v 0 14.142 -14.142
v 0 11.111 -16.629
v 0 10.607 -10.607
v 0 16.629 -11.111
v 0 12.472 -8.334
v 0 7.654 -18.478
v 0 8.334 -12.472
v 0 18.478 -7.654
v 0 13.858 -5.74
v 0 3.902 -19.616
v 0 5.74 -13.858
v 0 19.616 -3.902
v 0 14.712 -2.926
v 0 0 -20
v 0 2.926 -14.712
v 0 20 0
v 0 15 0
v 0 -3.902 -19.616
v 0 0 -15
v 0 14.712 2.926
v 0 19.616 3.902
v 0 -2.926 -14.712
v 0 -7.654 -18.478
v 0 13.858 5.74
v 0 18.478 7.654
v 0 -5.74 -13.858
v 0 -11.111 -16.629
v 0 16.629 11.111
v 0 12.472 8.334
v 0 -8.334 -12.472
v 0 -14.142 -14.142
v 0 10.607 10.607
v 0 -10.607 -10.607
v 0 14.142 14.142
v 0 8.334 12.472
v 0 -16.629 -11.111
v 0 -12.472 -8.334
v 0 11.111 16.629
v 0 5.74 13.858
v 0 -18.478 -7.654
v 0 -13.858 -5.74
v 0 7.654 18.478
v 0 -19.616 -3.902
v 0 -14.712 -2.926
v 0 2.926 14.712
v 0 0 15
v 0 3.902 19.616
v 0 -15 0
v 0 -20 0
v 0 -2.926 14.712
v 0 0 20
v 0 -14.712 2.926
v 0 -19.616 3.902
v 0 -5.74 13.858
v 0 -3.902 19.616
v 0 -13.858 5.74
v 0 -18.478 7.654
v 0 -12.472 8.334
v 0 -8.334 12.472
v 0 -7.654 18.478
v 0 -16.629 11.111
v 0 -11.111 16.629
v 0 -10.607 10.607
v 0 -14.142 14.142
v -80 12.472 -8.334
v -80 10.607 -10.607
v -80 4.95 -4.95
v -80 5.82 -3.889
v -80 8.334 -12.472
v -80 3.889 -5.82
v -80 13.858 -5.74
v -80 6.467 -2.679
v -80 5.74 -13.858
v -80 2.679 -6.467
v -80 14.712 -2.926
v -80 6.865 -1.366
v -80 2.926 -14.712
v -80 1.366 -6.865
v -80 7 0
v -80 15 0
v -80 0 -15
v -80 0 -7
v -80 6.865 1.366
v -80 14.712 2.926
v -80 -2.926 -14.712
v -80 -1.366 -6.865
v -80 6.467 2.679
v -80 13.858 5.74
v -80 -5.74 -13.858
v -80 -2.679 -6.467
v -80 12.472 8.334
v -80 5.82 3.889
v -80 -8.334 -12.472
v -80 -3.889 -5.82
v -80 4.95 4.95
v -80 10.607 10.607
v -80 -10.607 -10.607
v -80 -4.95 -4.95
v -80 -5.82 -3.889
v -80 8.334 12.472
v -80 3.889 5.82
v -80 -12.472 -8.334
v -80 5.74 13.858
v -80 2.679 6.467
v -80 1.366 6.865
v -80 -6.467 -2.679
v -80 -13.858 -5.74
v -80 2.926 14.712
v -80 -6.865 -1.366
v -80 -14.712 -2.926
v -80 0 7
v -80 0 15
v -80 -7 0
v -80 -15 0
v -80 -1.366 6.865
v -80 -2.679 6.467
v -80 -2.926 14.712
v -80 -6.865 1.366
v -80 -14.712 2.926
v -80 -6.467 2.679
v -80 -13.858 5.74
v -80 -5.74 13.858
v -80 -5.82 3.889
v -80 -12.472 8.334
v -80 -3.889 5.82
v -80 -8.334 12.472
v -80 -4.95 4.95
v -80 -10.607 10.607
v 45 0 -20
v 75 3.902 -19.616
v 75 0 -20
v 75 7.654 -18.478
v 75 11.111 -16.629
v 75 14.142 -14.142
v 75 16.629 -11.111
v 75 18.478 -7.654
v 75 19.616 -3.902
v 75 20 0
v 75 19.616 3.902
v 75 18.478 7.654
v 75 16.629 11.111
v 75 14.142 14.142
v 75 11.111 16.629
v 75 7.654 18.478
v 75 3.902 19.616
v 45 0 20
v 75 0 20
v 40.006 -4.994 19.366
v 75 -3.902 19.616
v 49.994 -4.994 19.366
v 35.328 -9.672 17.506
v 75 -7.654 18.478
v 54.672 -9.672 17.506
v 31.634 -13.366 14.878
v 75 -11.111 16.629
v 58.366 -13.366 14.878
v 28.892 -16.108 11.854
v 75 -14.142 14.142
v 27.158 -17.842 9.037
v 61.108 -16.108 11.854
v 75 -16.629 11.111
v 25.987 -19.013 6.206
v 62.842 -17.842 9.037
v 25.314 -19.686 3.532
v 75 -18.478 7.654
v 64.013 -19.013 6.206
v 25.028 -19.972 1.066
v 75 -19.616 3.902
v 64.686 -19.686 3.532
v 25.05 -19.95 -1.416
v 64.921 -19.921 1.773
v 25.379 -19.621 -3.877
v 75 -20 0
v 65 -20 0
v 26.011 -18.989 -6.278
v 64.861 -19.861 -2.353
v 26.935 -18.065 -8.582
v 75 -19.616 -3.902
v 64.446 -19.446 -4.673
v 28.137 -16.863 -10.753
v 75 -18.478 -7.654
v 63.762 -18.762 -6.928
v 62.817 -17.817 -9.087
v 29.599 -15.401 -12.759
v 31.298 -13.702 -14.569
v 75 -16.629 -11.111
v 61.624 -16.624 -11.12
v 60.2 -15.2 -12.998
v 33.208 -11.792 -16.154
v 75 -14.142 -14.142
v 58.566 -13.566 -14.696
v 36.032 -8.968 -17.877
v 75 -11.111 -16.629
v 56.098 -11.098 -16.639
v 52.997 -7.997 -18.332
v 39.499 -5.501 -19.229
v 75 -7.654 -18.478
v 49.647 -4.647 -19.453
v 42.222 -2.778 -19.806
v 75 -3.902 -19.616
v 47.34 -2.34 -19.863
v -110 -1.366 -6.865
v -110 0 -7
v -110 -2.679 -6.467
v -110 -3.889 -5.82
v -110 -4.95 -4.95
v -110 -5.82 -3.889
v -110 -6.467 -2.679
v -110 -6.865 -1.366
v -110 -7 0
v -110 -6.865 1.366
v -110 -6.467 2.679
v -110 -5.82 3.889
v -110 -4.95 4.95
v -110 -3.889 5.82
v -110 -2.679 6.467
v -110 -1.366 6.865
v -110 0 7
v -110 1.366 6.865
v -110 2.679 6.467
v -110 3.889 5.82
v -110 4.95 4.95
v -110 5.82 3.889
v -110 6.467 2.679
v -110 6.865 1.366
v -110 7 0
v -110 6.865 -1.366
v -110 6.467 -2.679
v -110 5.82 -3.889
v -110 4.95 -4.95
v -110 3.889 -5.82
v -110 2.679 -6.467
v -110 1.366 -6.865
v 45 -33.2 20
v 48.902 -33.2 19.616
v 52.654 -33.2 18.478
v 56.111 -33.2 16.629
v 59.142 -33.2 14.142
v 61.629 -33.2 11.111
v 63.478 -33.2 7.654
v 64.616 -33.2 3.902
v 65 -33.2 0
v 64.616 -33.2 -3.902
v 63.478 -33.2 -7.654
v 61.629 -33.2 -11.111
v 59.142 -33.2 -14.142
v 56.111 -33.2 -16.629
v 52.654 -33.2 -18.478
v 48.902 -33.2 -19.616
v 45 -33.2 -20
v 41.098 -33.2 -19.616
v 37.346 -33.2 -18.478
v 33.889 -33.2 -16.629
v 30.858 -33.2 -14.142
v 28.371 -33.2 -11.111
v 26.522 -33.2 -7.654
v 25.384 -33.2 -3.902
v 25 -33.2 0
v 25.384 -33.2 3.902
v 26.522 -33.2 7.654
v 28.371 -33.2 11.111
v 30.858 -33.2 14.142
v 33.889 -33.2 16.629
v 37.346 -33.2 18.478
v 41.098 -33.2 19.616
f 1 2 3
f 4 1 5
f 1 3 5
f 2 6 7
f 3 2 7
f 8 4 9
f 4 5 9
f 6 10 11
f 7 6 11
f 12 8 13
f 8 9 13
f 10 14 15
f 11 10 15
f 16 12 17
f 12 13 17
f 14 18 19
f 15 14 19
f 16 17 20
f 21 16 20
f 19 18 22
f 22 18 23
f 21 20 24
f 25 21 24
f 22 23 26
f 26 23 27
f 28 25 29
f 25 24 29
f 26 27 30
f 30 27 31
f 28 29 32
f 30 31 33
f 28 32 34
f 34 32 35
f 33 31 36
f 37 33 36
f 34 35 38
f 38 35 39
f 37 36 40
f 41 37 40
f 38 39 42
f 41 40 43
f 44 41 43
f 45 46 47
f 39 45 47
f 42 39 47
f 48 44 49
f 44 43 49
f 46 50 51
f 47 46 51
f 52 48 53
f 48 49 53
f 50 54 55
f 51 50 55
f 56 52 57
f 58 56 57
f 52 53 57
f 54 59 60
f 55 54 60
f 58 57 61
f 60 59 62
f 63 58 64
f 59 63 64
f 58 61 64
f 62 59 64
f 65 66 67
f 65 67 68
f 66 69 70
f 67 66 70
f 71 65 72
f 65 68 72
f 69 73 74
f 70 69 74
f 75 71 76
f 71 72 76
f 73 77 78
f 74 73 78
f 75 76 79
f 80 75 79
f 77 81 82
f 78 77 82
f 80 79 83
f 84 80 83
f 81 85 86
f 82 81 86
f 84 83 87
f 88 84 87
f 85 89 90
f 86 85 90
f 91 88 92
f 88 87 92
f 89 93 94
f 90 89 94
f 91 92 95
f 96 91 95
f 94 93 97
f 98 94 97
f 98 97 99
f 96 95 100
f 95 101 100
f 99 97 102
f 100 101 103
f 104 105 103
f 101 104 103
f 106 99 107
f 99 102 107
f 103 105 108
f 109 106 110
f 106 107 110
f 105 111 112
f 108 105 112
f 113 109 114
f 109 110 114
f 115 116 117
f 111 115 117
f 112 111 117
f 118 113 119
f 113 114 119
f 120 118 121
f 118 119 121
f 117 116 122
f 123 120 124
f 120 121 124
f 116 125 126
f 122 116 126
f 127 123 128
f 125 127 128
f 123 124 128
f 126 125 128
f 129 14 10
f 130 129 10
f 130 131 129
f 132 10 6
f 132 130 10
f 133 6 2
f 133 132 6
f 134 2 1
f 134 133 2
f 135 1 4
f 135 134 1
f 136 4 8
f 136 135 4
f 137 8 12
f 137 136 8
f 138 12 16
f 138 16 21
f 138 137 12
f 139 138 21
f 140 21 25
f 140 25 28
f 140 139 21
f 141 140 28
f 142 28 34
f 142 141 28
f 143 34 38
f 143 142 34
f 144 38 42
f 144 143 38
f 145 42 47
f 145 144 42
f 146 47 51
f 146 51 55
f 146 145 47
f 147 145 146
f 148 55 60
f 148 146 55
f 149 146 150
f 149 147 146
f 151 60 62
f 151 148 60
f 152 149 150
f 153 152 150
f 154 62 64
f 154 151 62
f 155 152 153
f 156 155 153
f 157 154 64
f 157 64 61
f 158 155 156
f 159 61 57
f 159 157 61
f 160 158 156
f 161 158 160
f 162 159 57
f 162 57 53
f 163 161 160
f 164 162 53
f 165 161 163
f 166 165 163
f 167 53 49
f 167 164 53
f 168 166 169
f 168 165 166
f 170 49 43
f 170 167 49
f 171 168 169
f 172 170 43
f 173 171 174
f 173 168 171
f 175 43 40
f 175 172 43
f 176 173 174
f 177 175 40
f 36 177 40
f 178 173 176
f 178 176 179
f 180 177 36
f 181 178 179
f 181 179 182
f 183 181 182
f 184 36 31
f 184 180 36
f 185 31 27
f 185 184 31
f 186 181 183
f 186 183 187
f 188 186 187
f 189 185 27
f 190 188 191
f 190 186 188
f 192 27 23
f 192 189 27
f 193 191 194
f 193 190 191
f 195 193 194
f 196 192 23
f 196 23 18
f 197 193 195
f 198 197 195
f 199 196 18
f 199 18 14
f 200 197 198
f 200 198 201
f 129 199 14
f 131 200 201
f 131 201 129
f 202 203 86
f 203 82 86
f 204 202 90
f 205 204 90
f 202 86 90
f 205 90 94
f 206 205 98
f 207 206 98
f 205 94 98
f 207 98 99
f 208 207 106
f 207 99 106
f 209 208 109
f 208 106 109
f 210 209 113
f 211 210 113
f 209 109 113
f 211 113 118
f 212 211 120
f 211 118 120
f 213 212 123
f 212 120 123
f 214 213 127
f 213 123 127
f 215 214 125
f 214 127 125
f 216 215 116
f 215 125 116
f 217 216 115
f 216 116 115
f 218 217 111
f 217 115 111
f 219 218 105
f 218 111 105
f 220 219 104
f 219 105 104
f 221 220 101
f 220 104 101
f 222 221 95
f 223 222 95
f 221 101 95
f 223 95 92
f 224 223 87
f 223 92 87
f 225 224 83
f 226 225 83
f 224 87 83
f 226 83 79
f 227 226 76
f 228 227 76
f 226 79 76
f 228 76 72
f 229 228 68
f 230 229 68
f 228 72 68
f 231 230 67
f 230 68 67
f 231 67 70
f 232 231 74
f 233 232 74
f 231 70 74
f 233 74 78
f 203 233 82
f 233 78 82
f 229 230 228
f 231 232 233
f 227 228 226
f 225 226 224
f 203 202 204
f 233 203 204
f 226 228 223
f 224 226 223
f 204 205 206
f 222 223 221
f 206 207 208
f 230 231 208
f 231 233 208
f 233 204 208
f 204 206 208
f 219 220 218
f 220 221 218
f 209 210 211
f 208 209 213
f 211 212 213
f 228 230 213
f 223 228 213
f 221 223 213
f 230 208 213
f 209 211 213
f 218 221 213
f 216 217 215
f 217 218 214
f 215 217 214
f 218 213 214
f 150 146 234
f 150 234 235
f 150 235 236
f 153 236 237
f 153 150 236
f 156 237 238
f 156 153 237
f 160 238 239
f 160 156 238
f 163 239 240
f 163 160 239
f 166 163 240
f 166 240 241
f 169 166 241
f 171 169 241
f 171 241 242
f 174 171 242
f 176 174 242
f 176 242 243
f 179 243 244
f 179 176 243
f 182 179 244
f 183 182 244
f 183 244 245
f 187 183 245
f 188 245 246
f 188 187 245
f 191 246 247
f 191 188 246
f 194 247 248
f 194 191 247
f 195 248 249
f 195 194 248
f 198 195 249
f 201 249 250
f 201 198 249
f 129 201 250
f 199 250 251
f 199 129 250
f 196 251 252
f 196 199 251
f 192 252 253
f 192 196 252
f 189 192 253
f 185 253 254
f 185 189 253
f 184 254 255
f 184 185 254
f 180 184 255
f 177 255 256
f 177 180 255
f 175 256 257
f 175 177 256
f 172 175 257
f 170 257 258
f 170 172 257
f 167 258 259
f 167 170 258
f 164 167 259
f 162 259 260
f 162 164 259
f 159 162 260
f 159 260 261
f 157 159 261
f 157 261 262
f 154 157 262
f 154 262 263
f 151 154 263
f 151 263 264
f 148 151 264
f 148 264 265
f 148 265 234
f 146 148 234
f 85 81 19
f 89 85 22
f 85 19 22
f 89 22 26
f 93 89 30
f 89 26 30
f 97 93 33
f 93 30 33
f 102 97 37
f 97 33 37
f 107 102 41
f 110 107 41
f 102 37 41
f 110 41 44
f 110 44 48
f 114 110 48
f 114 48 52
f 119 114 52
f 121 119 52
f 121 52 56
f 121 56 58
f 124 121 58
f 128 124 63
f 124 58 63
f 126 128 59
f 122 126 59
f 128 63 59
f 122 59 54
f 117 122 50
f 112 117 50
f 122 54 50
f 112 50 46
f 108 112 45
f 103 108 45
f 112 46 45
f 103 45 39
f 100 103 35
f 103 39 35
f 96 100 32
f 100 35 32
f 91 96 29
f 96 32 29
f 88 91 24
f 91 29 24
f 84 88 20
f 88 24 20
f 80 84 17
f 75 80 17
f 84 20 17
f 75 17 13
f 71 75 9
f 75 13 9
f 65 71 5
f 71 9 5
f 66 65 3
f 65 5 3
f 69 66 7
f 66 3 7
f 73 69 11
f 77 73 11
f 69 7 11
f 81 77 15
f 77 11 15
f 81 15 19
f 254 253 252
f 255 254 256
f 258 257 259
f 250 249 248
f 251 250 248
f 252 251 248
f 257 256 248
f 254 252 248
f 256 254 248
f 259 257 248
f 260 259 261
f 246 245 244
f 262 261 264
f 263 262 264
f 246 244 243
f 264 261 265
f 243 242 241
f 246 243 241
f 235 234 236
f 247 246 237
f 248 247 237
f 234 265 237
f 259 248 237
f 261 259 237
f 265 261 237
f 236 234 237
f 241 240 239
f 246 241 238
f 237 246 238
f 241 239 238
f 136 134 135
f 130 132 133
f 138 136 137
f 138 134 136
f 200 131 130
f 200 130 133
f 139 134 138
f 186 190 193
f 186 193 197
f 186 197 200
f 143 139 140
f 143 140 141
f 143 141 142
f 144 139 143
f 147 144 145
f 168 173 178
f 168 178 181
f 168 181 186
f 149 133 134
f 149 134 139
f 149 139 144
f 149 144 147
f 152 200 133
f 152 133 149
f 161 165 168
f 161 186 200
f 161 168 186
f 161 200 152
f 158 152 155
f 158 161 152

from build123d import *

# Parameters (mm, degrees)
SKETCH2_R           = 20
SKETCH4_R           = 20
BOSS_EXTRUDE1_DEPTH = 33.2


with BuildPart() as part:
    # Sweep1: sweep along a path in Sketch1
    with BuildLine(Plane.XY) as sweep1_path:
        Line((0, 0), (75, 0))
    # Sketch2 → Sweep1 (sweep)
    with BuildSketch(Plane(origin=(0, 0, 0), x_dir=(0, 0, -1), z_dir=(1, 0, 0))):
        Circle(SKETCH2_R)
    sweep(path=sweep1_path.line)

    # Sketch4 → Boss-Extrude1 (add)
    with BuildSketch(Plane(origin=(0, 0, 0), x_dir=(1, 0, 0), z_dir=(0, 1, 0))):
        with Locations(Location((45, 0, 0), (0, 0, 270))):
            Circle(SKETCH4_R)
    extrude(amount=-BOSS_EXTRUDE1_DEPTH)

    # Sketch5 → Revolve1 (revolve)
    with BuildSketch(Plane(origin=(0, 0, 0), x_dir=(1, 0, 0), z_dir=(0, 1, 0))):
        Polygon((0, 0), (-110, 0), (-110, 7), (-80, 7), (-80, 15), (0, 15), align=None)
    revolve(axis=Axis((-110, 0, 0), (-1, 0, 0)))


solid = part.part
